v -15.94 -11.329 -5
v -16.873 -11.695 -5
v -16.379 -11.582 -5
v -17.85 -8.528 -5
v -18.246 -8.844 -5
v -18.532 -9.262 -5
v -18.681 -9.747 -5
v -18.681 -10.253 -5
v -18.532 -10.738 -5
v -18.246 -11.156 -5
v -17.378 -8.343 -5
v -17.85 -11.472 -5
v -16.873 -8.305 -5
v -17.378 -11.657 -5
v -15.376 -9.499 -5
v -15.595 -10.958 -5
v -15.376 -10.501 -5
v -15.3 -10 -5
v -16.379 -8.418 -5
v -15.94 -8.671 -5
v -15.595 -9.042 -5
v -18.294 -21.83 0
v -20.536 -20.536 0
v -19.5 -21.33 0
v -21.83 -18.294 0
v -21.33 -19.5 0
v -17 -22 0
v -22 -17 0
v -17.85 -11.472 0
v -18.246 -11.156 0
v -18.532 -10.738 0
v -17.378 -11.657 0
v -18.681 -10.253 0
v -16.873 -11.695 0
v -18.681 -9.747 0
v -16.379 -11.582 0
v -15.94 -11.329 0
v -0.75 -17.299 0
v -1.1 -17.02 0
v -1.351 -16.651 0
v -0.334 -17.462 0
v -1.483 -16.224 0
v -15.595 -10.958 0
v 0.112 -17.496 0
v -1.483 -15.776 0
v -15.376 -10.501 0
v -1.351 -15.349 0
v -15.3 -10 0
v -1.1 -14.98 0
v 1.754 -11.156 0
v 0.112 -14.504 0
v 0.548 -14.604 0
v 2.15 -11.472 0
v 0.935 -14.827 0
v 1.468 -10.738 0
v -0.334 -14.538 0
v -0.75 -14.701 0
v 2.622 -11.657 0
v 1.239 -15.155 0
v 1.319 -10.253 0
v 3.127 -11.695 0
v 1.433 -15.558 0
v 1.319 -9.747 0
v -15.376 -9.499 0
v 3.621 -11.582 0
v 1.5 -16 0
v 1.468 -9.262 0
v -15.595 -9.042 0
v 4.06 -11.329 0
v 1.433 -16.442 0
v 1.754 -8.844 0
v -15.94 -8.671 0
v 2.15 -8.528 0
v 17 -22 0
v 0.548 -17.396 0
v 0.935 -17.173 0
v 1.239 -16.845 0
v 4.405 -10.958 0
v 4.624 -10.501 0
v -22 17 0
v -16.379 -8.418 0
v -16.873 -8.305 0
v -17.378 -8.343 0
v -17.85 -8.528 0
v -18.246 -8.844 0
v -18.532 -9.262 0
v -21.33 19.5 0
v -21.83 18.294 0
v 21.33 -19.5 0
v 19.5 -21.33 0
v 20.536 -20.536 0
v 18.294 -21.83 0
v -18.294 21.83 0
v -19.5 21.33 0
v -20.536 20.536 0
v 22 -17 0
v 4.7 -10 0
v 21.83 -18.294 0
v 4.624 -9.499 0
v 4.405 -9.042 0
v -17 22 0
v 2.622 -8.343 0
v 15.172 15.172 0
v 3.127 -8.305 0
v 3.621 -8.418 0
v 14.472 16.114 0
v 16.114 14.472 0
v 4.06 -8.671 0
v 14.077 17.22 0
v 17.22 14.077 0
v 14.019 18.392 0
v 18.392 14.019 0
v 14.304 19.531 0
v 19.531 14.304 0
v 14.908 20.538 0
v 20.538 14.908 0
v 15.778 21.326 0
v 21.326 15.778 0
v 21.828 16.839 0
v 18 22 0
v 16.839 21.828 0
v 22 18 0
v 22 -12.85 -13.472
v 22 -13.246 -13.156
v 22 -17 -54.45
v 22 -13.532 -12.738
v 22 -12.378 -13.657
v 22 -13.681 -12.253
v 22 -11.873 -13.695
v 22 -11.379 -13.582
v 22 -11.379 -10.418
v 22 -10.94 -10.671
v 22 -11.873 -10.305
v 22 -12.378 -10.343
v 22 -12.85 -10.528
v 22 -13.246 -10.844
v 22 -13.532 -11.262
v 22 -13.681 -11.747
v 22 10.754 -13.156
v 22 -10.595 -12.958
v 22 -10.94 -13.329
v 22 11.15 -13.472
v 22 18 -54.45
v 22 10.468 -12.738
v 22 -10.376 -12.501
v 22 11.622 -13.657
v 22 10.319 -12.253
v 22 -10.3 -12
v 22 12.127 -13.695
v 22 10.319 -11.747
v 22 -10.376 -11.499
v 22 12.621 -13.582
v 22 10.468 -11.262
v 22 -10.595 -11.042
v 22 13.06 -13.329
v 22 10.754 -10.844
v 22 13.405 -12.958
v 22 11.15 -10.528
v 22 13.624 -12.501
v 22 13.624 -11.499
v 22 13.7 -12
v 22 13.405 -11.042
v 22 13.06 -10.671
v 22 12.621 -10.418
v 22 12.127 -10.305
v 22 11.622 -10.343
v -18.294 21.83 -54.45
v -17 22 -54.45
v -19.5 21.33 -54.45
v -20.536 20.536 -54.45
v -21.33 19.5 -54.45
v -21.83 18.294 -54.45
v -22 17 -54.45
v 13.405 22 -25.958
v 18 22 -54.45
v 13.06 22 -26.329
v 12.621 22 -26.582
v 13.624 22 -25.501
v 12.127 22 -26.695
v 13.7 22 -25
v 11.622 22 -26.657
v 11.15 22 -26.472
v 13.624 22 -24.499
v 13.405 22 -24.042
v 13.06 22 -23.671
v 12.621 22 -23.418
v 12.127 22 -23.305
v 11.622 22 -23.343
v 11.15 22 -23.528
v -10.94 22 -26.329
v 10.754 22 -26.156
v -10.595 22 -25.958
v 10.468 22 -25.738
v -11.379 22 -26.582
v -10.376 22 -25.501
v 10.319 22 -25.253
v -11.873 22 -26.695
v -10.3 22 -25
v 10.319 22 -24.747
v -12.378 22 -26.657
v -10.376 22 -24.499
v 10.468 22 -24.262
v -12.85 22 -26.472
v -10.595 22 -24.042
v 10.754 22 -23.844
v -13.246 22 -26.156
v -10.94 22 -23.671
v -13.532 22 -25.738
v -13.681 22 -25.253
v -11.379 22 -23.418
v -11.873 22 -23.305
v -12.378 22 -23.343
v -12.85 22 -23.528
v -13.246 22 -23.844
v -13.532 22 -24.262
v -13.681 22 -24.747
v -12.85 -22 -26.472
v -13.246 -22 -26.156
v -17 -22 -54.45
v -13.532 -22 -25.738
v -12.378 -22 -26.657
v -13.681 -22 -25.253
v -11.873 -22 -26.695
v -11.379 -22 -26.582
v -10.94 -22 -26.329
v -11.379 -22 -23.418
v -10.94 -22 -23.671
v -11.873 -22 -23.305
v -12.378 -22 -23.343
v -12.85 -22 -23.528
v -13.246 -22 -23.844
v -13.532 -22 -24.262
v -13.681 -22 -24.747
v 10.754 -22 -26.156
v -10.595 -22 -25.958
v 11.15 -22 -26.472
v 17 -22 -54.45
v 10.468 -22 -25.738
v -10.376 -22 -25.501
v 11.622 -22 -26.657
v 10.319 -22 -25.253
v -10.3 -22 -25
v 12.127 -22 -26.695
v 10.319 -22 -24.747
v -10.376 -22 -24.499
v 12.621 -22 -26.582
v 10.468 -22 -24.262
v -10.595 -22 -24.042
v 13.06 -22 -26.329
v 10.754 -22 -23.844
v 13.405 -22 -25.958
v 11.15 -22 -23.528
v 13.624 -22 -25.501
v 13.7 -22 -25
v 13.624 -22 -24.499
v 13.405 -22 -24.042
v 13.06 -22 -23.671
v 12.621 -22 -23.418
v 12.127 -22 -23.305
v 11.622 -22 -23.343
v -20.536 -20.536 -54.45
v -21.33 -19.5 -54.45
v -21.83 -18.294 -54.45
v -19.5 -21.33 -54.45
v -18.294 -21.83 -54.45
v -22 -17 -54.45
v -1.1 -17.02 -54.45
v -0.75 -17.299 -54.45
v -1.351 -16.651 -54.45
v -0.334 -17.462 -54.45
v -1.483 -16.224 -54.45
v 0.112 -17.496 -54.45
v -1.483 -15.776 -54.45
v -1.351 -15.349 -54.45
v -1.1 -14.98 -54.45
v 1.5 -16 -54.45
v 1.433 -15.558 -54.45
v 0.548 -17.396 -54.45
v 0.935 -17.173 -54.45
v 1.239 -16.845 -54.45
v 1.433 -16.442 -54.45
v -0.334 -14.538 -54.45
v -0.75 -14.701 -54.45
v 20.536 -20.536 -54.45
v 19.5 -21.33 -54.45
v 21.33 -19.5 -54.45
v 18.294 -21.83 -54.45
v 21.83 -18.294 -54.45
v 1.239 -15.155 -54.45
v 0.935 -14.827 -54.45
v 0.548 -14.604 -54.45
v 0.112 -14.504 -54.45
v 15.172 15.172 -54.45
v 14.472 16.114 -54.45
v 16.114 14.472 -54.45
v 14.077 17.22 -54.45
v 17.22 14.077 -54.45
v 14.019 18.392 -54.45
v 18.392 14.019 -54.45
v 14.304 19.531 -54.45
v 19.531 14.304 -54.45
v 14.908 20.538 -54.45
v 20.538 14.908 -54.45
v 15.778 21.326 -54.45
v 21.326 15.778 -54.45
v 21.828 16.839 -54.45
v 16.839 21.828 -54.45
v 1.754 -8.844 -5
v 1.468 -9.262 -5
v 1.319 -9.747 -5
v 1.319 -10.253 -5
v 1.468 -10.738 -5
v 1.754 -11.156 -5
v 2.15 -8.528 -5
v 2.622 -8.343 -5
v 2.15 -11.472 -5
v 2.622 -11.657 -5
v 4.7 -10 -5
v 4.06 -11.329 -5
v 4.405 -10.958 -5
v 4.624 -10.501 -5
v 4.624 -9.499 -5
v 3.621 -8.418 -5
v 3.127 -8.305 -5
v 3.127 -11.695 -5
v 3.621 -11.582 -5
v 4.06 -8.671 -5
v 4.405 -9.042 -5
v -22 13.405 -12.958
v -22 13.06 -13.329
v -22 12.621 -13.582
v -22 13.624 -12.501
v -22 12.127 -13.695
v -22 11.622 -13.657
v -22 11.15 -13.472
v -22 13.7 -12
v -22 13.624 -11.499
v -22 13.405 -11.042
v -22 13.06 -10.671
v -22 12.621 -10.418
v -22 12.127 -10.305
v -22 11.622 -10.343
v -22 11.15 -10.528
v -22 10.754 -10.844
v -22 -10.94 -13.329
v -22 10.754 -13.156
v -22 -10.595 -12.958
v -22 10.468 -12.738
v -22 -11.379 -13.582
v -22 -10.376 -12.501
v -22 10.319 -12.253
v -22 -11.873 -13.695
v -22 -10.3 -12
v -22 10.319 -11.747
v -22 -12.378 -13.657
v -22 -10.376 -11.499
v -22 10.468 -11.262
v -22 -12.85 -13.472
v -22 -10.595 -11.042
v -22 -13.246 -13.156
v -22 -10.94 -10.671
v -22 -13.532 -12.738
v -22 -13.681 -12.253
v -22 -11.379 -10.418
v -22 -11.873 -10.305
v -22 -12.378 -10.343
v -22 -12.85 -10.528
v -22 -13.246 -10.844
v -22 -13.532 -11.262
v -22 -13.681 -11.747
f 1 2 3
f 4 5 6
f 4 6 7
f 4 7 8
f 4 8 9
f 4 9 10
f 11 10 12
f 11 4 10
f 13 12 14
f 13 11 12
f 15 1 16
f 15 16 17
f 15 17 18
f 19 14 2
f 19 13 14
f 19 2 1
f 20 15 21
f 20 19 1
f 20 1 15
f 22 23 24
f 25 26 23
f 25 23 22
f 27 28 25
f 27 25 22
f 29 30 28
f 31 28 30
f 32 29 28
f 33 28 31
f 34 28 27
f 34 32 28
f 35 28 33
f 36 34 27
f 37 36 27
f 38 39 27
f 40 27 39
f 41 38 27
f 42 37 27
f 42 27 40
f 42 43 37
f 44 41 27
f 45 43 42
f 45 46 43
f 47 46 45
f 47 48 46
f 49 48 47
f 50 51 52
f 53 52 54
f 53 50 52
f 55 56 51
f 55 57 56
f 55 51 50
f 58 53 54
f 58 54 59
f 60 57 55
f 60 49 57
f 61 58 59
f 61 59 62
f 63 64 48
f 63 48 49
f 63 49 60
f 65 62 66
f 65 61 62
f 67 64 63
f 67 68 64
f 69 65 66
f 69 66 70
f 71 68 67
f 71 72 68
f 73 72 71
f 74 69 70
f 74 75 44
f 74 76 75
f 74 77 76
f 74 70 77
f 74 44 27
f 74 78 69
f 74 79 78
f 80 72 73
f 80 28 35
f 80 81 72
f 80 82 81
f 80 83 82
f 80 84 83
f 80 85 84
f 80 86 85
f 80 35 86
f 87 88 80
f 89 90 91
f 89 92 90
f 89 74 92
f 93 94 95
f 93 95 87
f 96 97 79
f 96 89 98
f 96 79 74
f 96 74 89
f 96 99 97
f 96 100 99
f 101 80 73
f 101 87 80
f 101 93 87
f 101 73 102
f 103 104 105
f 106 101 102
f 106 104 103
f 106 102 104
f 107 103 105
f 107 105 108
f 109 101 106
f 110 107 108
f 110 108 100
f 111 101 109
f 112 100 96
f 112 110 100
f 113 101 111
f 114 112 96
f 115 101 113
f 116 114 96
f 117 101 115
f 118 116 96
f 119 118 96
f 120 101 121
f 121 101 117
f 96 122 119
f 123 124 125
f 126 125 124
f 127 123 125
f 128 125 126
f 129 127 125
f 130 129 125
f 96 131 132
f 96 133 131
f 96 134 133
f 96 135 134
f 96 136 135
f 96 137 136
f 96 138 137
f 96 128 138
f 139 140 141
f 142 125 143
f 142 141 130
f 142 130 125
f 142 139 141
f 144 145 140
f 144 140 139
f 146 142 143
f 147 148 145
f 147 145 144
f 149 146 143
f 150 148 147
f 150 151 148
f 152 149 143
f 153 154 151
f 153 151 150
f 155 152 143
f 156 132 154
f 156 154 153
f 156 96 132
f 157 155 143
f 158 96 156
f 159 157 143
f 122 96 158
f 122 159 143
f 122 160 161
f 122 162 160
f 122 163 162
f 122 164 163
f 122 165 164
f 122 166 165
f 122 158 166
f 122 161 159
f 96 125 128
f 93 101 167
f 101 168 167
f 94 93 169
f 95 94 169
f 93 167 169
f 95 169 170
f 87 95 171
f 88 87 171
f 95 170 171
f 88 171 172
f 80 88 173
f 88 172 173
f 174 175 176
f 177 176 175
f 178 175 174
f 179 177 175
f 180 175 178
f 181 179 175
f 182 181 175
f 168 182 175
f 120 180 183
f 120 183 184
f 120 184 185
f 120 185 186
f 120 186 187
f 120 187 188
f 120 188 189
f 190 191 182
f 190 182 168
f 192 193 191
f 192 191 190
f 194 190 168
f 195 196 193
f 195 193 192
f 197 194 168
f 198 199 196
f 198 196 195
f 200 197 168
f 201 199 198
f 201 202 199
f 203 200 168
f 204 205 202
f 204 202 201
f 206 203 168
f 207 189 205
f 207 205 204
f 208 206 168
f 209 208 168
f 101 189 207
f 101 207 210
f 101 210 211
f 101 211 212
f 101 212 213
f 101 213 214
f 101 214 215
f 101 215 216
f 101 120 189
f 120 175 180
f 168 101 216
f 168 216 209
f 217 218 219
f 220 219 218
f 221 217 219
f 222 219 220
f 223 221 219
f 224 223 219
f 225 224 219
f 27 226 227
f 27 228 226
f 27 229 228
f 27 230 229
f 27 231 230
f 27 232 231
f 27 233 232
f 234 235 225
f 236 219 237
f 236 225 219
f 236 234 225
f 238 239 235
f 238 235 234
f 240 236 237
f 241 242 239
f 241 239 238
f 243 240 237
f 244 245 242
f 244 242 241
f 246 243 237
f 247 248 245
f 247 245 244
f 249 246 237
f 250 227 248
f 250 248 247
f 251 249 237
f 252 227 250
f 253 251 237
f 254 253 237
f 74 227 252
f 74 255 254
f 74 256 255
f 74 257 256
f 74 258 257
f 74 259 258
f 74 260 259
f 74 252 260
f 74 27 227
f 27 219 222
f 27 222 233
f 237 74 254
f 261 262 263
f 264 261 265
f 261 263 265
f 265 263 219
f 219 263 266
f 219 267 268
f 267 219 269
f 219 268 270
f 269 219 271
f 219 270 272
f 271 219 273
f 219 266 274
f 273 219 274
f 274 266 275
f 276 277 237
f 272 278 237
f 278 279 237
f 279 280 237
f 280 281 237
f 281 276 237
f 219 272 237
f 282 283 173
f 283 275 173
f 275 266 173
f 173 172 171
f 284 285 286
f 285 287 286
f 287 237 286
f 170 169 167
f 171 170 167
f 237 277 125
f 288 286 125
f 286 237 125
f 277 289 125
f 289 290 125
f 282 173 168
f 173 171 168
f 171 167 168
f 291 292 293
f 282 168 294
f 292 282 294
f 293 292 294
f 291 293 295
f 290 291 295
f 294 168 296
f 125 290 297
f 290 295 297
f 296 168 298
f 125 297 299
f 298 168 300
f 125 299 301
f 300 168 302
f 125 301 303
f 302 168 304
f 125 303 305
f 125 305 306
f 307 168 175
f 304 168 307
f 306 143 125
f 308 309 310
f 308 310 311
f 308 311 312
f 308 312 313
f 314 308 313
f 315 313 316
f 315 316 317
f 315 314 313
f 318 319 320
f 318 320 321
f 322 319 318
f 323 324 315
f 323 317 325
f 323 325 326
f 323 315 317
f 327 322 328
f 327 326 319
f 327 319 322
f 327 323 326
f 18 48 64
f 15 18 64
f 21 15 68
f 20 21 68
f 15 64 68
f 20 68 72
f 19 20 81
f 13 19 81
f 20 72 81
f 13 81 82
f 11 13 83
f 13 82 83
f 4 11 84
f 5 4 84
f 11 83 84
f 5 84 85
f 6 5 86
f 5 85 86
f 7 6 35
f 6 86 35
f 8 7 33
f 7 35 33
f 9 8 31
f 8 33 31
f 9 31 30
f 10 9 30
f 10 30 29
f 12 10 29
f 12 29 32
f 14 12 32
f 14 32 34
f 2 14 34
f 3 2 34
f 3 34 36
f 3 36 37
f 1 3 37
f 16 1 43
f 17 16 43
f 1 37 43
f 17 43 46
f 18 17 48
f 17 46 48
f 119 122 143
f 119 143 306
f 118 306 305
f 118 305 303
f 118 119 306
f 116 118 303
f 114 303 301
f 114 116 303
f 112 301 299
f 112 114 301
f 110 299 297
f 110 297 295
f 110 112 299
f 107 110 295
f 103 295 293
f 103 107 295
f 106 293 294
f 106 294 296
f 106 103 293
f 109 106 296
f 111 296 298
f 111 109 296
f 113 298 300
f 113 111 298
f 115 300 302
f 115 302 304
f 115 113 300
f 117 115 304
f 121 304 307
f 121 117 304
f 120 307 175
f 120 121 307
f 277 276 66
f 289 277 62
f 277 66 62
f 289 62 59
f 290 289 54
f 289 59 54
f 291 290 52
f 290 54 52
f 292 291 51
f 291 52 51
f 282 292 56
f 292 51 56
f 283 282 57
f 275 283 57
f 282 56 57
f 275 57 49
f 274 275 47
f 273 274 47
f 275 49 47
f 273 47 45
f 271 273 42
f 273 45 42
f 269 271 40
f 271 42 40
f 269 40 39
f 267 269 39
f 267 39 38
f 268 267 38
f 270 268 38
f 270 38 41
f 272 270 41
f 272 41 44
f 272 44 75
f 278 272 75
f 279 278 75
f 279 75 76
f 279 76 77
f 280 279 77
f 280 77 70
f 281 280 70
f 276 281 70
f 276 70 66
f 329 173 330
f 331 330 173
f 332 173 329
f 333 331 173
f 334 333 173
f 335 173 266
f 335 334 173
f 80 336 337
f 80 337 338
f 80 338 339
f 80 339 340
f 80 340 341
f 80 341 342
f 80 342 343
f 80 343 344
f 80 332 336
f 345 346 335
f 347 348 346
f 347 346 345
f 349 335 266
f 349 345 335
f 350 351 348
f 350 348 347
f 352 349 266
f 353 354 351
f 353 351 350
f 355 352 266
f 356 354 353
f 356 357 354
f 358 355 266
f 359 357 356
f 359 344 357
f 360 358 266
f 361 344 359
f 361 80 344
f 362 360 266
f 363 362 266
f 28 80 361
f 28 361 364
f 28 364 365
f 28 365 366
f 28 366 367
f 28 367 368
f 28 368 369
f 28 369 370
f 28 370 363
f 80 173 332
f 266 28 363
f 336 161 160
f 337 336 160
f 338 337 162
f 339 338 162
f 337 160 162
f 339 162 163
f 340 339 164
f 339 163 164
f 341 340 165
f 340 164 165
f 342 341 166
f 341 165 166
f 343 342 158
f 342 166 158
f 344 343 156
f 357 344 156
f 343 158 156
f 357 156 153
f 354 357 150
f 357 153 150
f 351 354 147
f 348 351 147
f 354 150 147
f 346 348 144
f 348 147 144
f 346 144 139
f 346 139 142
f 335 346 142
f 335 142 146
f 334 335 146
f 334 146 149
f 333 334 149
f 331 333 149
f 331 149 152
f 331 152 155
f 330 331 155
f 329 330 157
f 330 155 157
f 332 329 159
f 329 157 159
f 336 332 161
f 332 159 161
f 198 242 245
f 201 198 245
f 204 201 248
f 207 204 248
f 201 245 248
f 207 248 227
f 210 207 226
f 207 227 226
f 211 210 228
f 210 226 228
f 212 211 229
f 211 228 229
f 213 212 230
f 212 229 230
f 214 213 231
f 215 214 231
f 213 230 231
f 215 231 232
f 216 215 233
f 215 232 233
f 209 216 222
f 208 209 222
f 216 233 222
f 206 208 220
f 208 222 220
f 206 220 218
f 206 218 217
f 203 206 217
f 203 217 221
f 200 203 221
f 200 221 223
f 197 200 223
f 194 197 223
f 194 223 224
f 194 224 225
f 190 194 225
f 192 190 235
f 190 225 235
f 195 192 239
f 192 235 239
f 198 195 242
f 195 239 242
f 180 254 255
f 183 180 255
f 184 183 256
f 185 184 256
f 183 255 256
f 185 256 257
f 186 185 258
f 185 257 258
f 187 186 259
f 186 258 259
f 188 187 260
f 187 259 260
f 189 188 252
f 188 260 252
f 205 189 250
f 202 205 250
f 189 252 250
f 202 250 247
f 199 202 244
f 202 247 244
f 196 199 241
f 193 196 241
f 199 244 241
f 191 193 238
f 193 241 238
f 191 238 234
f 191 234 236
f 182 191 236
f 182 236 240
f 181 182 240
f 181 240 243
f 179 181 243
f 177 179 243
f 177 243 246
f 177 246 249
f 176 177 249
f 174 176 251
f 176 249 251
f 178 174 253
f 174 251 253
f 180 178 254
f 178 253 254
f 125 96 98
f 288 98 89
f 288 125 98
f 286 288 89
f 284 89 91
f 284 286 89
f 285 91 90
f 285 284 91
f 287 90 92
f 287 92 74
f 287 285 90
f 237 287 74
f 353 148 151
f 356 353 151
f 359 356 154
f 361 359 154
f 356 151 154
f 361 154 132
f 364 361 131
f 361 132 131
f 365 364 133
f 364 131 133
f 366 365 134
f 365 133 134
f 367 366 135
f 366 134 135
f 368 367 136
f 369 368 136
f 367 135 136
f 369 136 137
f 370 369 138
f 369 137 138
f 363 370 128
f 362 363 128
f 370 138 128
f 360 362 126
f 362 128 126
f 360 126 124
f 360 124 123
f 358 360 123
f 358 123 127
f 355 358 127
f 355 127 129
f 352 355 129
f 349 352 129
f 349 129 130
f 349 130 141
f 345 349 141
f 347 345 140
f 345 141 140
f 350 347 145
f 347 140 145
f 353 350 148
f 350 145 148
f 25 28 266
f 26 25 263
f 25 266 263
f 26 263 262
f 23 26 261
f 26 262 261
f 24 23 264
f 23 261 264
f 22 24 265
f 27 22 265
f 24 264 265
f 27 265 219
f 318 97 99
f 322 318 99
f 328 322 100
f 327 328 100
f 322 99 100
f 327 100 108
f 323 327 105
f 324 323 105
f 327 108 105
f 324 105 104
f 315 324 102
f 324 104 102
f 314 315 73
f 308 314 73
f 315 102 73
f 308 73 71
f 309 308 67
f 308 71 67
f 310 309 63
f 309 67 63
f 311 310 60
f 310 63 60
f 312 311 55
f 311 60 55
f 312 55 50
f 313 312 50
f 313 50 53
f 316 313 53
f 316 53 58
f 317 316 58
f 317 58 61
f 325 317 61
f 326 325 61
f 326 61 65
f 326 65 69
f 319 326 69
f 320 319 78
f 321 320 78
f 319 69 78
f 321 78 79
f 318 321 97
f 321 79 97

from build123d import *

# Parameters (mm, degrees)
F0_R     = 1.7
F0_R_2   = 1.5
F1_DEPTH = 54.45
F2_R     = 1.7
F3_DEPTH = 44
F4_R     = 1.7
F5_DEPTH = 44
F6_R     = 5
F7_DEPTH = 55
F8_DEPTH = 5


with BuildPart() as f1:
    # F0 (on Top) → F1 (new body)
    with BuildSketch(Plane.XY):
        with BuildLine():
            Line((18, 22), (-22, 22))
            Line((-22, 22), (-22, -22))
            Line((-22, -22), (22, -22))
            Line((22, -22), (22, 18))
            ThreePointArc((22, 18), (15.171573, 15.171573), (18, 22))
        make_face()
        with Locations((-17, -10)):
            Circle(F0_R, mode=Mode.SUBTRACT)
        with Locations((0, -16)):
            Circle(F0_R_2, mode=Mode.SUBTRACT)
        with Locations((3, -10)):
            Circle(F0_R, mode=Mode.SUBTRACT)
        with Locations((-17, -10)):
            Circle(F0_R)
        with Locations((0, -16)):
            Circle(F0_R_2)
        with Locations((3, -10)):
            Circle(F0_R)
    extrude(amount=-F1_DEPTH)

    # F2 (on face) → F3 (cut)
    with BuildSketch(Plane.XZ.offset(22)):
        with Locations((-12, -25)):
            Circle(F2_R)
        with Locations((12, -25)):
            Circle(F2_R)
    extrude(amount=-F3_DEPTH, mode=Mode.SUBTRACT)

    # F4 (on face) → F5 (cut)
    with BuildSketch(Plane.YZ.offset(22)):
        with Locations((-12, -12)):
            Circle(F4_R)
        with Locations((12, -12)):
            Circle(F4_R)
    extrude(amount=-F5_DEPTH, mode=Mode.SUBTRACT)

    # F6
    f6_edges = [f1.edges().sort_by_distance(p)[0] for p in [
        (22, -22, -27.225),
        (-22, -22, -27.225),
        (-22, 22, -27.225),
    ]]
    fillet(f6_edges, radius=F6_R)

    # F0 (on Top) → F7 (cut)
    with BuildSketch(Plane.XY):
        with Locations((0, -16)):
            Circle(F0_R_2)
    extrude(amount=-F7_DEPTH, mode=Mode.SUBTRACT)

    # F0 (on Top) → F8 (cut)
    with BuildSketch(Plane.XY):
        with Locations((-17, -10)):
            Circle(F0_R)
        with Locations((3, -10)):
            Circle(F0_R)
    extrude(amount=-F8_DEPTH, mode=Mode.SUBTRACT)


solid = f1.part
